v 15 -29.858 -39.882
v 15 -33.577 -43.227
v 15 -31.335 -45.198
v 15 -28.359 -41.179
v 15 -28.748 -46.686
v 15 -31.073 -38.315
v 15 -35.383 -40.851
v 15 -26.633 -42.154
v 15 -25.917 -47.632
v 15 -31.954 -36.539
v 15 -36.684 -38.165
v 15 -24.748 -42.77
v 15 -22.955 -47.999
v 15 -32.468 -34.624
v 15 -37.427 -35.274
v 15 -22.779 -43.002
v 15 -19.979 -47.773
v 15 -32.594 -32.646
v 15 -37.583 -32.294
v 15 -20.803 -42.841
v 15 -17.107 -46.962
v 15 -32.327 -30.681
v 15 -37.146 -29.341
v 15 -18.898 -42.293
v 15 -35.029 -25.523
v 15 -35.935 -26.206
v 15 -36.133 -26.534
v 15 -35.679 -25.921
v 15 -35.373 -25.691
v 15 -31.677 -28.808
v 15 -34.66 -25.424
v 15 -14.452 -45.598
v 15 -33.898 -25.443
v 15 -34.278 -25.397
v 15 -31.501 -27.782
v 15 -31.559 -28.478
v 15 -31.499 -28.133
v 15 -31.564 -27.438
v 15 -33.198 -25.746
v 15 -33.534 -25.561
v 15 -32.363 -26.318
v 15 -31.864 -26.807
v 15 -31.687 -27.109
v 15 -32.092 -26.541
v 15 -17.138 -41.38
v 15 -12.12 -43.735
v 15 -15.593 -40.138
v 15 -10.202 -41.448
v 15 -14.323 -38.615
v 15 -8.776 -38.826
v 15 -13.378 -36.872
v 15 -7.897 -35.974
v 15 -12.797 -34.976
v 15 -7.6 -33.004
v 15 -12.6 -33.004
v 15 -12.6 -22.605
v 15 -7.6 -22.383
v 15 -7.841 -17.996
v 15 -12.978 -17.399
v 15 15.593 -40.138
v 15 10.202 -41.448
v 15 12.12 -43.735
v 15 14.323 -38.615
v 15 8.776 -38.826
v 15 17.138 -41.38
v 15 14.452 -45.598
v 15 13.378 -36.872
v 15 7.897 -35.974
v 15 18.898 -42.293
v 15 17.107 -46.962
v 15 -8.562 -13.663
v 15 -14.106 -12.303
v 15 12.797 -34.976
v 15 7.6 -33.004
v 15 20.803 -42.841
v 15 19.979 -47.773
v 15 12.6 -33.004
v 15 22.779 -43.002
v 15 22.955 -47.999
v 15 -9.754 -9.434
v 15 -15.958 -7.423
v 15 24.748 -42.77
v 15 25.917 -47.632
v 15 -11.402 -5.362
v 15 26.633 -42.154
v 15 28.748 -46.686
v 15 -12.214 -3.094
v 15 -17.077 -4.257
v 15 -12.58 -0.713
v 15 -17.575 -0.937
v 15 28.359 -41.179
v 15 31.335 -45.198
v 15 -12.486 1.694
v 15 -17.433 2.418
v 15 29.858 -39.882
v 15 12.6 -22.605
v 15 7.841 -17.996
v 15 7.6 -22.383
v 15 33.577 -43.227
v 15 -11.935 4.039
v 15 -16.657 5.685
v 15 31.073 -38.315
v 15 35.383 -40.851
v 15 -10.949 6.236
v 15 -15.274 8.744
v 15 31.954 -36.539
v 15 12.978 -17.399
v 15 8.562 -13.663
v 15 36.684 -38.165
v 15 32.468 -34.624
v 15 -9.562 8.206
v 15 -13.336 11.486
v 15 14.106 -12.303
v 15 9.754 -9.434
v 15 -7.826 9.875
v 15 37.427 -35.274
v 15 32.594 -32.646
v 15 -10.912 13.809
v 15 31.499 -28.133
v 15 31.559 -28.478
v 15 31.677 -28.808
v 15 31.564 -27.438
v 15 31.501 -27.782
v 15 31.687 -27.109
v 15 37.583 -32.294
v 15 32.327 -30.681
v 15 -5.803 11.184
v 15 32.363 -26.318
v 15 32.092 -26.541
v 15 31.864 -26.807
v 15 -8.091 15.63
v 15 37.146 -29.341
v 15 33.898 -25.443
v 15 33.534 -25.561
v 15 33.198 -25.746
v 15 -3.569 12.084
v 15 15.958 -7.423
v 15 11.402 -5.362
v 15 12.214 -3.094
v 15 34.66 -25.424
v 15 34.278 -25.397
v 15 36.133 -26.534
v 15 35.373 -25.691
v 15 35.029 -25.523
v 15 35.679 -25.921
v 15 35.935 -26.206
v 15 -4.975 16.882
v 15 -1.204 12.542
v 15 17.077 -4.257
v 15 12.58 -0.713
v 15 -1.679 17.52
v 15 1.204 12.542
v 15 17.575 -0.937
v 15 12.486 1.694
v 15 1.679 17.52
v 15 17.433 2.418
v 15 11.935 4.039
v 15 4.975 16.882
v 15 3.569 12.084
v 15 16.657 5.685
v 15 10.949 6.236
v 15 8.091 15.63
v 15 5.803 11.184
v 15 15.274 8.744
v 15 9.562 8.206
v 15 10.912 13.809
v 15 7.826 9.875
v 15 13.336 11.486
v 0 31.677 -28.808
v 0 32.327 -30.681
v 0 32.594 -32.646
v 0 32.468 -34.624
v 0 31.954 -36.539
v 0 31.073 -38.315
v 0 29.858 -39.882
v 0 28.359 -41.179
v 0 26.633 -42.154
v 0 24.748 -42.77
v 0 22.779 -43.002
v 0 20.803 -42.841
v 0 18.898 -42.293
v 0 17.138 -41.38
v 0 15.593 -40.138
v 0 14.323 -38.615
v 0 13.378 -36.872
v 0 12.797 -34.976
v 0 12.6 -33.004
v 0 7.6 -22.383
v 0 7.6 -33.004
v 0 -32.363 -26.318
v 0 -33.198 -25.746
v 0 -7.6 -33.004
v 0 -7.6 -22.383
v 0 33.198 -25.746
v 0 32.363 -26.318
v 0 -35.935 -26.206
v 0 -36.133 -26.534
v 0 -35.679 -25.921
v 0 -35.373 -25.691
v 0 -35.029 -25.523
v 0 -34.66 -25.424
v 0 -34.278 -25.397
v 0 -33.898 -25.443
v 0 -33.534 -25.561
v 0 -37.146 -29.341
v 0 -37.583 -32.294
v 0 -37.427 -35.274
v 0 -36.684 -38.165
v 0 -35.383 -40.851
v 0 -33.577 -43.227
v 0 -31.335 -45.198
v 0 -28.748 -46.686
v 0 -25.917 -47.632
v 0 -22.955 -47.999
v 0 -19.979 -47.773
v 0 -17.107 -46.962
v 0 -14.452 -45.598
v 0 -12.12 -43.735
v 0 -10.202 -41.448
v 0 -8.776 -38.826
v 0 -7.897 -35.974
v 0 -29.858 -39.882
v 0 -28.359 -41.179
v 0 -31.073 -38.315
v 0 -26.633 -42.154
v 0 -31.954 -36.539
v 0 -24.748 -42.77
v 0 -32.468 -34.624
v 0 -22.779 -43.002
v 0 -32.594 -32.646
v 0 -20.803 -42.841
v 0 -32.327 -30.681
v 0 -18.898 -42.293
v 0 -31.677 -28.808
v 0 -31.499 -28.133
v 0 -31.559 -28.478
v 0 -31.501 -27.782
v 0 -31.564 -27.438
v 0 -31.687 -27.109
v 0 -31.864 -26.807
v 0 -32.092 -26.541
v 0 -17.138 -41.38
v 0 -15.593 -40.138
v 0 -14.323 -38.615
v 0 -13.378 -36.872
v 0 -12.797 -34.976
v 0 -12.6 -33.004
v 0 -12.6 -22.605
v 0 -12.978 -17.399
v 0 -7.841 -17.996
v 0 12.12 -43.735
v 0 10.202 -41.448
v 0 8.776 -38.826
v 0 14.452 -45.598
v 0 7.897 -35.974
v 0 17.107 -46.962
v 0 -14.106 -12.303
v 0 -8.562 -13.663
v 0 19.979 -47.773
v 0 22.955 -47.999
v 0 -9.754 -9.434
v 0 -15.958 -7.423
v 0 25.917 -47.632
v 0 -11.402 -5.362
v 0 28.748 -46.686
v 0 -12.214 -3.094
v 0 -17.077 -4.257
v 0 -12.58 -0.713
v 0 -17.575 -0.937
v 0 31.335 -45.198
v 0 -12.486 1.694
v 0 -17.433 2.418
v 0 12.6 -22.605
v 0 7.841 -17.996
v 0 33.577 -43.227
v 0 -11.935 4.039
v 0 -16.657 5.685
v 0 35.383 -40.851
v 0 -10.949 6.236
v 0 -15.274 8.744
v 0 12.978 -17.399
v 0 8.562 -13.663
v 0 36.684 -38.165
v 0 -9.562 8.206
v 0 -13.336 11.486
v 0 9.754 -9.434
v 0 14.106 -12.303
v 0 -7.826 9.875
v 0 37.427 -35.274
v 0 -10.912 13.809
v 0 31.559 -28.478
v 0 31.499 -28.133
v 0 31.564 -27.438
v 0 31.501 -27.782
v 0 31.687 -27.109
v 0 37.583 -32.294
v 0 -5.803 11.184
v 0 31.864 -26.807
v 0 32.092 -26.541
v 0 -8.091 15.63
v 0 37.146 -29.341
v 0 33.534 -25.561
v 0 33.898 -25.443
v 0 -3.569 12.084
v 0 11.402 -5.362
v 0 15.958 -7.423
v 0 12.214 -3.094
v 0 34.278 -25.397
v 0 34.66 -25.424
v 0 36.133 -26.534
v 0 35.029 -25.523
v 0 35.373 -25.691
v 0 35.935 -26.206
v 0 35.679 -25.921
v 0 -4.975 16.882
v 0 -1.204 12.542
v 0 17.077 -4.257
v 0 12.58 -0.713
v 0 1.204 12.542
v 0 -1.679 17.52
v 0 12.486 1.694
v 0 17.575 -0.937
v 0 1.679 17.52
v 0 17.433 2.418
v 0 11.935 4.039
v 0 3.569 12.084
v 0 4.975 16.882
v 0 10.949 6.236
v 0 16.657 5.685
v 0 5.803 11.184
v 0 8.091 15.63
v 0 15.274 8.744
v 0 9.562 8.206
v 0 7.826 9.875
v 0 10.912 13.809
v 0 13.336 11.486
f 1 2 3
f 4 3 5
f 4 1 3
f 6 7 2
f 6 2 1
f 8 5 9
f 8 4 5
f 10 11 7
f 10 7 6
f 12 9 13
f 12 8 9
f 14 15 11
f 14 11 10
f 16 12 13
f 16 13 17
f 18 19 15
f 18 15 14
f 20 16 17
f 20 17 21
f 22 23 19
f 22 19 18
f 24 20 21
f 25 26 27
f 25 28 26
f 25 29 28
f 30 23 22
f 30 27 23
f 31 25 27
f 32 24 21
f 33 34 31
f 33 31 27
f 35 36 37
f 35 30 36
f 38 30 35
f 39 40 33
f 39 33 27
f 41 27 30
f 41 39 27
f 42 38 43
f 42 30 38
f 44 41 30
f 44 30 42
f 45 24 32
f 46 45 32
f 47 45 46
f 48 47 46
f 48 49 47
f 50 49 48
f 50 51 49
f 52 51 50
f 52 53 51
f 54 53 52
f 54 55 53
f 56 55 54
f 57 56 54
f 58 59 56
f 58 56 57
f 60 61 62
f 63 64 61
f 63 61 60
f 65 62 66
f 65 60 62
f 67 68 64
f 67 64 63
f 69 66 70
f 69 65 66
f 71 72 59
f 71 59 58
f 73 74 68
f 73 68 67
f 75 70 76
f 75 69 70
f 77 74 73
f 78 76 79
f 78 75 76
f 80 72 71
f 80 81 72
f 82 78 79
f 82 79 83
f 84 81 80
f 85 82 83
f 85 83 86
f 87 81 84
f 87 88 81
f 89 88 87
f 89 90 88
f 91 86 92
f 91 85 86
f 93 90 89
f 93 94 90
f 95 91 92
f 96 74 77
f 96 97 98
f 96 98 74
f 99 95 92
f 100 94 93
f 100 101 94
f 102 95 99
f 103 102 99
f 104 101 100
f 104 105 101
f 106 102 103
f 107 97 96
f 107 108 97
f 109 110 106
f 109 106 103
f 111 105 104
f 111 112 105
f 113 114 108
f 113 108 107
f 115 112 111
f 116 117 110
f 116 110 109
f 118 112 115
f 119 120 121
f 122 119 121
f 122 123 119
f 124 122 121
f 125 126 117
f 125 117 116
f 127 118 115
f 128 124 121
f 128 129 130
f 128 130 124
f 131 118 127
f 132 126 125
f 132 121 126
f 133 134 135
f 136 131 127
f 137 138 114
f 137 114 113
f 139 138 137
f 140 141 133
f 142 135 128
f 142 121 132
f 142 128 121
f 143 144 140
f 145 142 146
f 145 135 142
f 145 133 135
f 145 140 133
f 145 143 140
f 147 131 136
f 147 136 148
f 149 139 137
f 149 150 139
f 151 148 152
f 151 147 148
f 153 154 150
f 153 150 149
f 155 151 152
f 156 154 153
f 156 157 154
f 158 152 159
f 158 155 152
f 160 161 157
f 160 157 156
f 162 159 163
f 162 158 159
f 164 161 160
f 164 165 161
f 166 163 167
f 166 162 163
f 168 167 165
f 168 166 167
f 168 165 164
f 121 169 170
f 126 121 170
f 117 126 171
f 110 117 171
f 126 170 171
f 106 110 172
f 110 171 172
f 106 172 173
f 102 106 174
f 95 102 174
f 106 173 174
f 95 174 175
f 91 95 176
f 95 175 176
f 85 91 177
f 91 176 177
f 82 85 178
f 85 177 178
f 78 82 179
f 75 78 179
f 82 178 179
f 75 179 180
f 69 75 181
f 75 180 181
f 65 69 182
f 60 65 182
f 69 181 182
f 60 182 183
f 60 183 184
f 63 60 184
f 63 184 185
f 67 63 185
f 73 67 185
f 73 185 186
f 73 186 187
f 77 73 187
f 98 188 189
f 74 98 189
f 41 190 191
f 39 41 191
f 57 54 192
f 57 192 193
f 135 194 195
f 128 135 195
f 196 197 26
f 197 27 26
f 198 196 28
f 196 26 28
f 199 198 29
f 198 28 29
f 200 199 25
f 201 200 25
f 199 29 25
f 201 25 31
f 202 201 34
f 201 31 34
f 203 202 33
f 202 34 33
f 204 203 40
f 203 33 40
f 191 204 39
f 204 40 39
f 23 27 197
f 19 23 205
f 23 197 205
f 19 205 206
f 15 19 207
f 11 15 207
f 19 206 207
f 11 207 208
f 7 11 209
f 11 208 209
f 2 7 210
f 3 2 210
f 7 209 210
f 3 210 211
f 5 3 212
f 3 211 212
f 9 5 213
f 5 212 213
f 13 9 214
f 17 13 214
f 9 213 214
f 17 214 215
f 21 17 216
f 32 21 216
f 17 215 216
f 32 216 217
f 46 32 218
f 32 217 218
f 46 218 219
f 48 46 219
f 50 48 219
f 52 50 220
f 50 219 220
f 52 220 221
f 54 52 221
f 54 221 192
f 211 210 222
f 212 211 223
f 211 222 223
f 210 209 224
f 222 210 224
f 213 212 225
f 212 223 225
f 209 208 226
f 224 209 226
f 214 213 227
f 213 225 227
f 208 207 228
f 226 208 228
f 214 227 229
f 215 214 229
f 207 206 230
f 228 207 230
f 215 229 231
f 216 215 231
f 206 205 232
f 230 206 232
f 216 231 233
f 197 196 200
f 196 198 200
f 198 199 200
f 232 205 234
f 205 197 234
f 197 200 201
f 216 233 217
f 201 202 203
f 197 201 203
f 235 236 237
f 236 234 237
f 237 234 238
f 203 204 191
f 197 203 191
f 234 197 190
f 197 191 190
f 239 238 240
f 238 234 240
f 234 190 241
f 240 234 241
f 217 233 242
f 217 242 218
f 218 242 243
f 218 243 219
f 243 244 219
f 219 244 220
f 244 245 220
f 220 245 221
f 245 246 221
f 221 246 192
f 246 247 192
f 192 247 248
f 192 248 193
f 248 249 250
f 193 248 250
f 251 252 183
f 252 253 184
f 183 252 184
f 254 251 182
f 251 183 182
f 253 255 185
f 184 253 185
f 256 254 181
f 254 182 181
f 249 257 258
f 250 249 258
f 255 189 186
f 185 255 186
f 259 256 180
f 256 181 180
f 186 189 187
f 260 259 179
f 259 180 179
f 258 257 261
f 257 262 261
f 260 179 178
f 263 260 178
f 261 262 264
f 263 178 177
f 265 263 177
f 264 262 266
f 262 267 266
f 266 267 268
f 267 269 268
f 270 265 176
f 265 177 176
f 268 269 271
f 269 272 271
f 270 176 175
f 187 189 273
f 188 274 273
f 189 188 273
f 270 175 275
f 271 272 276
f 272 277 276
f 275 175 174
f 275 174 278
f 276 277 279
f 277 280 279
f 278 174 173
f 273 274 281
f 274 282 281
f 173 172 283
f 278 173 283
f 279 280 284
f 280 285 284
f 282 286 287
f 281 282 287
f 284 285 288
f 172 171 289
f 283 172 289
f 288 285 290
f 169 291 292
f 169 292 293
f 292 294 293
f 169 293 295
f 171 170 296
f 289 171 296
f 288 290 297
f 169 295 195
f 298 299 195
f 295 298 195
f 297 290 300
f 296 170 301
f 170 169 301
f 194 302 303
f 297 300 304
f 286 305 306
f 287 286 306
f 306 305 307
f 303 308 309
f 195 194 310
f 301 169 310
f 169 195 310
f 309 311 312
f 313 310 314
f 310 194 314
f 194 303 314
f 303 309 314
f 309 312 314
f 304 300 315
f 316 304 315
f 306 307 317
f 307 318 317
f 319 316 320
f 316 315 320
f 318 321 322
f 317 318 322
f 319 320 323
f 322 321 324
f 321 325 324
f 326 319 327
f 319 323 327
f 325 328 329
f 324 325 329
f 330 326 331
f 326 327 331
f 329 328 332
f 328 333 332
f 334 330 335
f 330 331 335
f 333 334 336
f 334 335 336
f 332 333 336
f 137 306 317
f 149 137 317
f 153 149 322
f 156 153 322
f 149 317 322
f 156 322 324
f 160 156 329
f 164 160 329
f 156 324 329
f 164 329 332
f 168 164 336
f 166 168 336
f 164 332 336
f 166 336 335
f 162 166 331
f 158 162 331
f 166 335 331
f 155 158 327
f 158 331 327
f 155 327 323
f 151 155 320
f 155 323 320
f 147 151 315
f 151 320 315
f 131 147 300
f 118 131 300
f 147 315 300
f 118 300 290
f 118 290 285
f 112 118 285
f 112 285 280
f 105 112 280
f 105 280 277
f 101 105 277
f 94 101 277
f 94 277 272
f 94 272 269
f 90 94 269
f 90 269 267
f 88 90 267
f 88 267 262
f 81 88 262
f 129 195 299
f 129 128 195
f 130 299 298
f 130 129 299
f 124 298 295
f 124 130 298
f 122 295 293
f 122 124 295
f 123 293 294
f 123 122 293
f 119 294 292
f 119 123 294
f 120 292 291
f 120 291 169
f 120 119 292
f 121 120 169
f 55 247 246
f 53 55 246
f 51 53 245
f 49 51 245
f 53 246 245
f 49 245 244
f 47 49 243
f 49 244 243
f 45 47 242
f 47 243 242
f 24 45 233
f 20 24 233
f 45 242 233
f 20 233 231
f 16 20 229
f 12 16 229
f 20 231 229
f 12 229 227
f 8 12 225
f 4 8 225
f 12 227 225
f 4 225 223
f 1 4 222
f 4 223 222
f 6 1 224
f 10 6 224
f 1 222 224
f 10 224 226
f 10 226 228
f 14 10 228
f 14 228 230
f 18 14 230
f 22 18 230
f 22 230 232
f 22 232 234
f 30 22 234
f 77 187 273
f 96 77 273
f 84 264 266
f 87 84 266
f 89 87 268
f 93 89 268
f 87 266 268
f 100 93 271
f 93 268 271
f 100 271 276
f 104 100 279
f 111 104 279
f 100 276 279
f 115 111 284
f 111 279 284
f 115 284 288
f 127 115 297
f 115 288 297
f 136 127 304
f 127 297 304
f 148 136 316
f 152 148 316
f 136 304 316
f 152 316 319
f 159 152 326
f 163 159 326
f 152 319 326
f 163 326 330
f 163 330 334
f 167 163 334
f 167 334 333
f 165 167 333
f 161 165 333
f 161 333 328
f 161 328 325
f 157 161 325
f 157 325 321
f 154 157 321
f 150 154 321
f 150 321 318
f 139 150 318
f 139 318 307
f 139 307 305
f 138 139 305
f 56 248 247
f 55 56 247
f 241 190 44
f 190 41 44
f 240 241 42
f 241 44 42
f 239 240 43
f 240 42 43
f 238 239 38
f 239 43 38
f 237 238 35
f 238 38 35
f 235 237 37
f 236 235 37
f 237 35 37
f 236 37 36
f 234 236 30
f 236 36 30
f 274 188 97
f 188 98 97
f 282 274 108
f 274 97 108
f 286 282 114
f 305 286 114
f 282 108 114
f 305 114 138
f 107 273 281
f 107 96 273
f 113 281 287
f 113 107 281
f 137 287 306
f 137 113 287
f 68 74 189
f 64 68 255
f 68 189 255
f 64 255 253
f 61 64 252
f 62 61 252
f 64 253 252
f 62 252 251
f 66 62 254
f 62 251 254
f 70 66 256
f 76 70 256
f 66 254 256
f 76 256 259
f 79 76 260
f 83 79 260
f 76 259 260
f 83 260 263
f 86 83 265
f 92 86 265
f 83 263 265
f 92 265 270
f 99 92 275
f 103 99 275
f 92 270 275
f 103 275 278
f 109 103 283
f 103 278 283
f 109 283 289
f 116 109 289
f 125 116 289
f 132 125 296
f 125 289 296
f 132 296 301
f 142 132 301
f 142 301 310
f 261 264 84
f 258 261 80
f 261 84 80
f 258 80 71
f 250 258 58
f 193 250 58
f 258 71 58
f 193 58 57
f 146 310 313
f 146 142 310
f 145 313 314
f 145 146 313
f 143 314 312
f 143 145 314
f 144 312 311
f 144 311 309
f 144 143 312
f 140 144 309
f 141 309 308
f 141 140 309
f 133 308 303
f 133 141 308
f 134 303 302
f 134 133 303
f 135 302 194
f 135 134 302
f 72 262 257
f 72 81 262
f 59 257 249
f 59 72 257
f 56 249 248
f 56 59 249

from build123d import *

# Parameters (mm, degrees)
F2_DEPTH = 15
F3_R     = 36
F4_R     = 40
F5_R     = 2


with BuildPart() as f2:
    # F1 (on Right) → F2 (new body)
    with BuildSketch(Plane.YZ):
        with BuildLine():
            ThreePointArc((-7.6, -10.049876), (0, 12.6), (7.6, -10.049876))
            Line((7.6, -10.049876), (7.6, -33.003636))
            ThreePointArc((7.6, -33.003636), (27.035907, -47.332723), (34.976364, -24.528636))
            Line((34.976364, -24.528636), (30.850909, -27.353636))
            ThreePointArc((30.850909, -27.353636), (25.557272, -42.556361), (12.6, -33.003636))
            Line((12.6, -33.003636), (12.6, -12.288206))
            ThreePointArc((12.6, -12.288206), (0, 17.6), (-12.6, -12.288206))
            Line((-12.6, -12.288206), (-12.6, -33.003636))
            ThreePointArc((-12.6, -33.003636), (-25.557272, -42.556361), (-30.850909, -27.353636))
            Line((-30.850909, -27.353636), (-34.976364, -24.528636))
            ThreePointArc((-34.976364, -24.528636), (-27.035907, -47.332723), (-7.6, -33.003636))
            Line((-7.6, -33.003636), (-7.6, -10.049876))
        make_face()
    extrude(amount=F2_DEPTH)

    # F3
    f3_edges = [f2.edges().sort_by_distance(p)[0] for p in [
        (7.5, 12.6, -12.288206),
        (7.5, -12.6, -12.288206),
    ]]
    fillet(f3_edges, radius=F3_R)

    # F4
    f4_edges = [f2.edges().sort_by_distance(p)[0] for p in [
        (7.5, 7.6, -10.049876),
        (7.5, -7.6, -10.049876),
    ]]
    fillet(f4_edges, radius=F4_R)

    # F5
    f5_edges = [f2.edges().sort_by_distance(p)[0] for p in [
        (7.5, 30.850909, -27.353636),
        (7.5, 34.976364, -24.528636),
        (7.5, -30.850909, -27.353636),
        (7.5, -34.976364, -24.528636),
    ]]
    fillet(f5_edges, radius=F5_R)


solid = f2.part
